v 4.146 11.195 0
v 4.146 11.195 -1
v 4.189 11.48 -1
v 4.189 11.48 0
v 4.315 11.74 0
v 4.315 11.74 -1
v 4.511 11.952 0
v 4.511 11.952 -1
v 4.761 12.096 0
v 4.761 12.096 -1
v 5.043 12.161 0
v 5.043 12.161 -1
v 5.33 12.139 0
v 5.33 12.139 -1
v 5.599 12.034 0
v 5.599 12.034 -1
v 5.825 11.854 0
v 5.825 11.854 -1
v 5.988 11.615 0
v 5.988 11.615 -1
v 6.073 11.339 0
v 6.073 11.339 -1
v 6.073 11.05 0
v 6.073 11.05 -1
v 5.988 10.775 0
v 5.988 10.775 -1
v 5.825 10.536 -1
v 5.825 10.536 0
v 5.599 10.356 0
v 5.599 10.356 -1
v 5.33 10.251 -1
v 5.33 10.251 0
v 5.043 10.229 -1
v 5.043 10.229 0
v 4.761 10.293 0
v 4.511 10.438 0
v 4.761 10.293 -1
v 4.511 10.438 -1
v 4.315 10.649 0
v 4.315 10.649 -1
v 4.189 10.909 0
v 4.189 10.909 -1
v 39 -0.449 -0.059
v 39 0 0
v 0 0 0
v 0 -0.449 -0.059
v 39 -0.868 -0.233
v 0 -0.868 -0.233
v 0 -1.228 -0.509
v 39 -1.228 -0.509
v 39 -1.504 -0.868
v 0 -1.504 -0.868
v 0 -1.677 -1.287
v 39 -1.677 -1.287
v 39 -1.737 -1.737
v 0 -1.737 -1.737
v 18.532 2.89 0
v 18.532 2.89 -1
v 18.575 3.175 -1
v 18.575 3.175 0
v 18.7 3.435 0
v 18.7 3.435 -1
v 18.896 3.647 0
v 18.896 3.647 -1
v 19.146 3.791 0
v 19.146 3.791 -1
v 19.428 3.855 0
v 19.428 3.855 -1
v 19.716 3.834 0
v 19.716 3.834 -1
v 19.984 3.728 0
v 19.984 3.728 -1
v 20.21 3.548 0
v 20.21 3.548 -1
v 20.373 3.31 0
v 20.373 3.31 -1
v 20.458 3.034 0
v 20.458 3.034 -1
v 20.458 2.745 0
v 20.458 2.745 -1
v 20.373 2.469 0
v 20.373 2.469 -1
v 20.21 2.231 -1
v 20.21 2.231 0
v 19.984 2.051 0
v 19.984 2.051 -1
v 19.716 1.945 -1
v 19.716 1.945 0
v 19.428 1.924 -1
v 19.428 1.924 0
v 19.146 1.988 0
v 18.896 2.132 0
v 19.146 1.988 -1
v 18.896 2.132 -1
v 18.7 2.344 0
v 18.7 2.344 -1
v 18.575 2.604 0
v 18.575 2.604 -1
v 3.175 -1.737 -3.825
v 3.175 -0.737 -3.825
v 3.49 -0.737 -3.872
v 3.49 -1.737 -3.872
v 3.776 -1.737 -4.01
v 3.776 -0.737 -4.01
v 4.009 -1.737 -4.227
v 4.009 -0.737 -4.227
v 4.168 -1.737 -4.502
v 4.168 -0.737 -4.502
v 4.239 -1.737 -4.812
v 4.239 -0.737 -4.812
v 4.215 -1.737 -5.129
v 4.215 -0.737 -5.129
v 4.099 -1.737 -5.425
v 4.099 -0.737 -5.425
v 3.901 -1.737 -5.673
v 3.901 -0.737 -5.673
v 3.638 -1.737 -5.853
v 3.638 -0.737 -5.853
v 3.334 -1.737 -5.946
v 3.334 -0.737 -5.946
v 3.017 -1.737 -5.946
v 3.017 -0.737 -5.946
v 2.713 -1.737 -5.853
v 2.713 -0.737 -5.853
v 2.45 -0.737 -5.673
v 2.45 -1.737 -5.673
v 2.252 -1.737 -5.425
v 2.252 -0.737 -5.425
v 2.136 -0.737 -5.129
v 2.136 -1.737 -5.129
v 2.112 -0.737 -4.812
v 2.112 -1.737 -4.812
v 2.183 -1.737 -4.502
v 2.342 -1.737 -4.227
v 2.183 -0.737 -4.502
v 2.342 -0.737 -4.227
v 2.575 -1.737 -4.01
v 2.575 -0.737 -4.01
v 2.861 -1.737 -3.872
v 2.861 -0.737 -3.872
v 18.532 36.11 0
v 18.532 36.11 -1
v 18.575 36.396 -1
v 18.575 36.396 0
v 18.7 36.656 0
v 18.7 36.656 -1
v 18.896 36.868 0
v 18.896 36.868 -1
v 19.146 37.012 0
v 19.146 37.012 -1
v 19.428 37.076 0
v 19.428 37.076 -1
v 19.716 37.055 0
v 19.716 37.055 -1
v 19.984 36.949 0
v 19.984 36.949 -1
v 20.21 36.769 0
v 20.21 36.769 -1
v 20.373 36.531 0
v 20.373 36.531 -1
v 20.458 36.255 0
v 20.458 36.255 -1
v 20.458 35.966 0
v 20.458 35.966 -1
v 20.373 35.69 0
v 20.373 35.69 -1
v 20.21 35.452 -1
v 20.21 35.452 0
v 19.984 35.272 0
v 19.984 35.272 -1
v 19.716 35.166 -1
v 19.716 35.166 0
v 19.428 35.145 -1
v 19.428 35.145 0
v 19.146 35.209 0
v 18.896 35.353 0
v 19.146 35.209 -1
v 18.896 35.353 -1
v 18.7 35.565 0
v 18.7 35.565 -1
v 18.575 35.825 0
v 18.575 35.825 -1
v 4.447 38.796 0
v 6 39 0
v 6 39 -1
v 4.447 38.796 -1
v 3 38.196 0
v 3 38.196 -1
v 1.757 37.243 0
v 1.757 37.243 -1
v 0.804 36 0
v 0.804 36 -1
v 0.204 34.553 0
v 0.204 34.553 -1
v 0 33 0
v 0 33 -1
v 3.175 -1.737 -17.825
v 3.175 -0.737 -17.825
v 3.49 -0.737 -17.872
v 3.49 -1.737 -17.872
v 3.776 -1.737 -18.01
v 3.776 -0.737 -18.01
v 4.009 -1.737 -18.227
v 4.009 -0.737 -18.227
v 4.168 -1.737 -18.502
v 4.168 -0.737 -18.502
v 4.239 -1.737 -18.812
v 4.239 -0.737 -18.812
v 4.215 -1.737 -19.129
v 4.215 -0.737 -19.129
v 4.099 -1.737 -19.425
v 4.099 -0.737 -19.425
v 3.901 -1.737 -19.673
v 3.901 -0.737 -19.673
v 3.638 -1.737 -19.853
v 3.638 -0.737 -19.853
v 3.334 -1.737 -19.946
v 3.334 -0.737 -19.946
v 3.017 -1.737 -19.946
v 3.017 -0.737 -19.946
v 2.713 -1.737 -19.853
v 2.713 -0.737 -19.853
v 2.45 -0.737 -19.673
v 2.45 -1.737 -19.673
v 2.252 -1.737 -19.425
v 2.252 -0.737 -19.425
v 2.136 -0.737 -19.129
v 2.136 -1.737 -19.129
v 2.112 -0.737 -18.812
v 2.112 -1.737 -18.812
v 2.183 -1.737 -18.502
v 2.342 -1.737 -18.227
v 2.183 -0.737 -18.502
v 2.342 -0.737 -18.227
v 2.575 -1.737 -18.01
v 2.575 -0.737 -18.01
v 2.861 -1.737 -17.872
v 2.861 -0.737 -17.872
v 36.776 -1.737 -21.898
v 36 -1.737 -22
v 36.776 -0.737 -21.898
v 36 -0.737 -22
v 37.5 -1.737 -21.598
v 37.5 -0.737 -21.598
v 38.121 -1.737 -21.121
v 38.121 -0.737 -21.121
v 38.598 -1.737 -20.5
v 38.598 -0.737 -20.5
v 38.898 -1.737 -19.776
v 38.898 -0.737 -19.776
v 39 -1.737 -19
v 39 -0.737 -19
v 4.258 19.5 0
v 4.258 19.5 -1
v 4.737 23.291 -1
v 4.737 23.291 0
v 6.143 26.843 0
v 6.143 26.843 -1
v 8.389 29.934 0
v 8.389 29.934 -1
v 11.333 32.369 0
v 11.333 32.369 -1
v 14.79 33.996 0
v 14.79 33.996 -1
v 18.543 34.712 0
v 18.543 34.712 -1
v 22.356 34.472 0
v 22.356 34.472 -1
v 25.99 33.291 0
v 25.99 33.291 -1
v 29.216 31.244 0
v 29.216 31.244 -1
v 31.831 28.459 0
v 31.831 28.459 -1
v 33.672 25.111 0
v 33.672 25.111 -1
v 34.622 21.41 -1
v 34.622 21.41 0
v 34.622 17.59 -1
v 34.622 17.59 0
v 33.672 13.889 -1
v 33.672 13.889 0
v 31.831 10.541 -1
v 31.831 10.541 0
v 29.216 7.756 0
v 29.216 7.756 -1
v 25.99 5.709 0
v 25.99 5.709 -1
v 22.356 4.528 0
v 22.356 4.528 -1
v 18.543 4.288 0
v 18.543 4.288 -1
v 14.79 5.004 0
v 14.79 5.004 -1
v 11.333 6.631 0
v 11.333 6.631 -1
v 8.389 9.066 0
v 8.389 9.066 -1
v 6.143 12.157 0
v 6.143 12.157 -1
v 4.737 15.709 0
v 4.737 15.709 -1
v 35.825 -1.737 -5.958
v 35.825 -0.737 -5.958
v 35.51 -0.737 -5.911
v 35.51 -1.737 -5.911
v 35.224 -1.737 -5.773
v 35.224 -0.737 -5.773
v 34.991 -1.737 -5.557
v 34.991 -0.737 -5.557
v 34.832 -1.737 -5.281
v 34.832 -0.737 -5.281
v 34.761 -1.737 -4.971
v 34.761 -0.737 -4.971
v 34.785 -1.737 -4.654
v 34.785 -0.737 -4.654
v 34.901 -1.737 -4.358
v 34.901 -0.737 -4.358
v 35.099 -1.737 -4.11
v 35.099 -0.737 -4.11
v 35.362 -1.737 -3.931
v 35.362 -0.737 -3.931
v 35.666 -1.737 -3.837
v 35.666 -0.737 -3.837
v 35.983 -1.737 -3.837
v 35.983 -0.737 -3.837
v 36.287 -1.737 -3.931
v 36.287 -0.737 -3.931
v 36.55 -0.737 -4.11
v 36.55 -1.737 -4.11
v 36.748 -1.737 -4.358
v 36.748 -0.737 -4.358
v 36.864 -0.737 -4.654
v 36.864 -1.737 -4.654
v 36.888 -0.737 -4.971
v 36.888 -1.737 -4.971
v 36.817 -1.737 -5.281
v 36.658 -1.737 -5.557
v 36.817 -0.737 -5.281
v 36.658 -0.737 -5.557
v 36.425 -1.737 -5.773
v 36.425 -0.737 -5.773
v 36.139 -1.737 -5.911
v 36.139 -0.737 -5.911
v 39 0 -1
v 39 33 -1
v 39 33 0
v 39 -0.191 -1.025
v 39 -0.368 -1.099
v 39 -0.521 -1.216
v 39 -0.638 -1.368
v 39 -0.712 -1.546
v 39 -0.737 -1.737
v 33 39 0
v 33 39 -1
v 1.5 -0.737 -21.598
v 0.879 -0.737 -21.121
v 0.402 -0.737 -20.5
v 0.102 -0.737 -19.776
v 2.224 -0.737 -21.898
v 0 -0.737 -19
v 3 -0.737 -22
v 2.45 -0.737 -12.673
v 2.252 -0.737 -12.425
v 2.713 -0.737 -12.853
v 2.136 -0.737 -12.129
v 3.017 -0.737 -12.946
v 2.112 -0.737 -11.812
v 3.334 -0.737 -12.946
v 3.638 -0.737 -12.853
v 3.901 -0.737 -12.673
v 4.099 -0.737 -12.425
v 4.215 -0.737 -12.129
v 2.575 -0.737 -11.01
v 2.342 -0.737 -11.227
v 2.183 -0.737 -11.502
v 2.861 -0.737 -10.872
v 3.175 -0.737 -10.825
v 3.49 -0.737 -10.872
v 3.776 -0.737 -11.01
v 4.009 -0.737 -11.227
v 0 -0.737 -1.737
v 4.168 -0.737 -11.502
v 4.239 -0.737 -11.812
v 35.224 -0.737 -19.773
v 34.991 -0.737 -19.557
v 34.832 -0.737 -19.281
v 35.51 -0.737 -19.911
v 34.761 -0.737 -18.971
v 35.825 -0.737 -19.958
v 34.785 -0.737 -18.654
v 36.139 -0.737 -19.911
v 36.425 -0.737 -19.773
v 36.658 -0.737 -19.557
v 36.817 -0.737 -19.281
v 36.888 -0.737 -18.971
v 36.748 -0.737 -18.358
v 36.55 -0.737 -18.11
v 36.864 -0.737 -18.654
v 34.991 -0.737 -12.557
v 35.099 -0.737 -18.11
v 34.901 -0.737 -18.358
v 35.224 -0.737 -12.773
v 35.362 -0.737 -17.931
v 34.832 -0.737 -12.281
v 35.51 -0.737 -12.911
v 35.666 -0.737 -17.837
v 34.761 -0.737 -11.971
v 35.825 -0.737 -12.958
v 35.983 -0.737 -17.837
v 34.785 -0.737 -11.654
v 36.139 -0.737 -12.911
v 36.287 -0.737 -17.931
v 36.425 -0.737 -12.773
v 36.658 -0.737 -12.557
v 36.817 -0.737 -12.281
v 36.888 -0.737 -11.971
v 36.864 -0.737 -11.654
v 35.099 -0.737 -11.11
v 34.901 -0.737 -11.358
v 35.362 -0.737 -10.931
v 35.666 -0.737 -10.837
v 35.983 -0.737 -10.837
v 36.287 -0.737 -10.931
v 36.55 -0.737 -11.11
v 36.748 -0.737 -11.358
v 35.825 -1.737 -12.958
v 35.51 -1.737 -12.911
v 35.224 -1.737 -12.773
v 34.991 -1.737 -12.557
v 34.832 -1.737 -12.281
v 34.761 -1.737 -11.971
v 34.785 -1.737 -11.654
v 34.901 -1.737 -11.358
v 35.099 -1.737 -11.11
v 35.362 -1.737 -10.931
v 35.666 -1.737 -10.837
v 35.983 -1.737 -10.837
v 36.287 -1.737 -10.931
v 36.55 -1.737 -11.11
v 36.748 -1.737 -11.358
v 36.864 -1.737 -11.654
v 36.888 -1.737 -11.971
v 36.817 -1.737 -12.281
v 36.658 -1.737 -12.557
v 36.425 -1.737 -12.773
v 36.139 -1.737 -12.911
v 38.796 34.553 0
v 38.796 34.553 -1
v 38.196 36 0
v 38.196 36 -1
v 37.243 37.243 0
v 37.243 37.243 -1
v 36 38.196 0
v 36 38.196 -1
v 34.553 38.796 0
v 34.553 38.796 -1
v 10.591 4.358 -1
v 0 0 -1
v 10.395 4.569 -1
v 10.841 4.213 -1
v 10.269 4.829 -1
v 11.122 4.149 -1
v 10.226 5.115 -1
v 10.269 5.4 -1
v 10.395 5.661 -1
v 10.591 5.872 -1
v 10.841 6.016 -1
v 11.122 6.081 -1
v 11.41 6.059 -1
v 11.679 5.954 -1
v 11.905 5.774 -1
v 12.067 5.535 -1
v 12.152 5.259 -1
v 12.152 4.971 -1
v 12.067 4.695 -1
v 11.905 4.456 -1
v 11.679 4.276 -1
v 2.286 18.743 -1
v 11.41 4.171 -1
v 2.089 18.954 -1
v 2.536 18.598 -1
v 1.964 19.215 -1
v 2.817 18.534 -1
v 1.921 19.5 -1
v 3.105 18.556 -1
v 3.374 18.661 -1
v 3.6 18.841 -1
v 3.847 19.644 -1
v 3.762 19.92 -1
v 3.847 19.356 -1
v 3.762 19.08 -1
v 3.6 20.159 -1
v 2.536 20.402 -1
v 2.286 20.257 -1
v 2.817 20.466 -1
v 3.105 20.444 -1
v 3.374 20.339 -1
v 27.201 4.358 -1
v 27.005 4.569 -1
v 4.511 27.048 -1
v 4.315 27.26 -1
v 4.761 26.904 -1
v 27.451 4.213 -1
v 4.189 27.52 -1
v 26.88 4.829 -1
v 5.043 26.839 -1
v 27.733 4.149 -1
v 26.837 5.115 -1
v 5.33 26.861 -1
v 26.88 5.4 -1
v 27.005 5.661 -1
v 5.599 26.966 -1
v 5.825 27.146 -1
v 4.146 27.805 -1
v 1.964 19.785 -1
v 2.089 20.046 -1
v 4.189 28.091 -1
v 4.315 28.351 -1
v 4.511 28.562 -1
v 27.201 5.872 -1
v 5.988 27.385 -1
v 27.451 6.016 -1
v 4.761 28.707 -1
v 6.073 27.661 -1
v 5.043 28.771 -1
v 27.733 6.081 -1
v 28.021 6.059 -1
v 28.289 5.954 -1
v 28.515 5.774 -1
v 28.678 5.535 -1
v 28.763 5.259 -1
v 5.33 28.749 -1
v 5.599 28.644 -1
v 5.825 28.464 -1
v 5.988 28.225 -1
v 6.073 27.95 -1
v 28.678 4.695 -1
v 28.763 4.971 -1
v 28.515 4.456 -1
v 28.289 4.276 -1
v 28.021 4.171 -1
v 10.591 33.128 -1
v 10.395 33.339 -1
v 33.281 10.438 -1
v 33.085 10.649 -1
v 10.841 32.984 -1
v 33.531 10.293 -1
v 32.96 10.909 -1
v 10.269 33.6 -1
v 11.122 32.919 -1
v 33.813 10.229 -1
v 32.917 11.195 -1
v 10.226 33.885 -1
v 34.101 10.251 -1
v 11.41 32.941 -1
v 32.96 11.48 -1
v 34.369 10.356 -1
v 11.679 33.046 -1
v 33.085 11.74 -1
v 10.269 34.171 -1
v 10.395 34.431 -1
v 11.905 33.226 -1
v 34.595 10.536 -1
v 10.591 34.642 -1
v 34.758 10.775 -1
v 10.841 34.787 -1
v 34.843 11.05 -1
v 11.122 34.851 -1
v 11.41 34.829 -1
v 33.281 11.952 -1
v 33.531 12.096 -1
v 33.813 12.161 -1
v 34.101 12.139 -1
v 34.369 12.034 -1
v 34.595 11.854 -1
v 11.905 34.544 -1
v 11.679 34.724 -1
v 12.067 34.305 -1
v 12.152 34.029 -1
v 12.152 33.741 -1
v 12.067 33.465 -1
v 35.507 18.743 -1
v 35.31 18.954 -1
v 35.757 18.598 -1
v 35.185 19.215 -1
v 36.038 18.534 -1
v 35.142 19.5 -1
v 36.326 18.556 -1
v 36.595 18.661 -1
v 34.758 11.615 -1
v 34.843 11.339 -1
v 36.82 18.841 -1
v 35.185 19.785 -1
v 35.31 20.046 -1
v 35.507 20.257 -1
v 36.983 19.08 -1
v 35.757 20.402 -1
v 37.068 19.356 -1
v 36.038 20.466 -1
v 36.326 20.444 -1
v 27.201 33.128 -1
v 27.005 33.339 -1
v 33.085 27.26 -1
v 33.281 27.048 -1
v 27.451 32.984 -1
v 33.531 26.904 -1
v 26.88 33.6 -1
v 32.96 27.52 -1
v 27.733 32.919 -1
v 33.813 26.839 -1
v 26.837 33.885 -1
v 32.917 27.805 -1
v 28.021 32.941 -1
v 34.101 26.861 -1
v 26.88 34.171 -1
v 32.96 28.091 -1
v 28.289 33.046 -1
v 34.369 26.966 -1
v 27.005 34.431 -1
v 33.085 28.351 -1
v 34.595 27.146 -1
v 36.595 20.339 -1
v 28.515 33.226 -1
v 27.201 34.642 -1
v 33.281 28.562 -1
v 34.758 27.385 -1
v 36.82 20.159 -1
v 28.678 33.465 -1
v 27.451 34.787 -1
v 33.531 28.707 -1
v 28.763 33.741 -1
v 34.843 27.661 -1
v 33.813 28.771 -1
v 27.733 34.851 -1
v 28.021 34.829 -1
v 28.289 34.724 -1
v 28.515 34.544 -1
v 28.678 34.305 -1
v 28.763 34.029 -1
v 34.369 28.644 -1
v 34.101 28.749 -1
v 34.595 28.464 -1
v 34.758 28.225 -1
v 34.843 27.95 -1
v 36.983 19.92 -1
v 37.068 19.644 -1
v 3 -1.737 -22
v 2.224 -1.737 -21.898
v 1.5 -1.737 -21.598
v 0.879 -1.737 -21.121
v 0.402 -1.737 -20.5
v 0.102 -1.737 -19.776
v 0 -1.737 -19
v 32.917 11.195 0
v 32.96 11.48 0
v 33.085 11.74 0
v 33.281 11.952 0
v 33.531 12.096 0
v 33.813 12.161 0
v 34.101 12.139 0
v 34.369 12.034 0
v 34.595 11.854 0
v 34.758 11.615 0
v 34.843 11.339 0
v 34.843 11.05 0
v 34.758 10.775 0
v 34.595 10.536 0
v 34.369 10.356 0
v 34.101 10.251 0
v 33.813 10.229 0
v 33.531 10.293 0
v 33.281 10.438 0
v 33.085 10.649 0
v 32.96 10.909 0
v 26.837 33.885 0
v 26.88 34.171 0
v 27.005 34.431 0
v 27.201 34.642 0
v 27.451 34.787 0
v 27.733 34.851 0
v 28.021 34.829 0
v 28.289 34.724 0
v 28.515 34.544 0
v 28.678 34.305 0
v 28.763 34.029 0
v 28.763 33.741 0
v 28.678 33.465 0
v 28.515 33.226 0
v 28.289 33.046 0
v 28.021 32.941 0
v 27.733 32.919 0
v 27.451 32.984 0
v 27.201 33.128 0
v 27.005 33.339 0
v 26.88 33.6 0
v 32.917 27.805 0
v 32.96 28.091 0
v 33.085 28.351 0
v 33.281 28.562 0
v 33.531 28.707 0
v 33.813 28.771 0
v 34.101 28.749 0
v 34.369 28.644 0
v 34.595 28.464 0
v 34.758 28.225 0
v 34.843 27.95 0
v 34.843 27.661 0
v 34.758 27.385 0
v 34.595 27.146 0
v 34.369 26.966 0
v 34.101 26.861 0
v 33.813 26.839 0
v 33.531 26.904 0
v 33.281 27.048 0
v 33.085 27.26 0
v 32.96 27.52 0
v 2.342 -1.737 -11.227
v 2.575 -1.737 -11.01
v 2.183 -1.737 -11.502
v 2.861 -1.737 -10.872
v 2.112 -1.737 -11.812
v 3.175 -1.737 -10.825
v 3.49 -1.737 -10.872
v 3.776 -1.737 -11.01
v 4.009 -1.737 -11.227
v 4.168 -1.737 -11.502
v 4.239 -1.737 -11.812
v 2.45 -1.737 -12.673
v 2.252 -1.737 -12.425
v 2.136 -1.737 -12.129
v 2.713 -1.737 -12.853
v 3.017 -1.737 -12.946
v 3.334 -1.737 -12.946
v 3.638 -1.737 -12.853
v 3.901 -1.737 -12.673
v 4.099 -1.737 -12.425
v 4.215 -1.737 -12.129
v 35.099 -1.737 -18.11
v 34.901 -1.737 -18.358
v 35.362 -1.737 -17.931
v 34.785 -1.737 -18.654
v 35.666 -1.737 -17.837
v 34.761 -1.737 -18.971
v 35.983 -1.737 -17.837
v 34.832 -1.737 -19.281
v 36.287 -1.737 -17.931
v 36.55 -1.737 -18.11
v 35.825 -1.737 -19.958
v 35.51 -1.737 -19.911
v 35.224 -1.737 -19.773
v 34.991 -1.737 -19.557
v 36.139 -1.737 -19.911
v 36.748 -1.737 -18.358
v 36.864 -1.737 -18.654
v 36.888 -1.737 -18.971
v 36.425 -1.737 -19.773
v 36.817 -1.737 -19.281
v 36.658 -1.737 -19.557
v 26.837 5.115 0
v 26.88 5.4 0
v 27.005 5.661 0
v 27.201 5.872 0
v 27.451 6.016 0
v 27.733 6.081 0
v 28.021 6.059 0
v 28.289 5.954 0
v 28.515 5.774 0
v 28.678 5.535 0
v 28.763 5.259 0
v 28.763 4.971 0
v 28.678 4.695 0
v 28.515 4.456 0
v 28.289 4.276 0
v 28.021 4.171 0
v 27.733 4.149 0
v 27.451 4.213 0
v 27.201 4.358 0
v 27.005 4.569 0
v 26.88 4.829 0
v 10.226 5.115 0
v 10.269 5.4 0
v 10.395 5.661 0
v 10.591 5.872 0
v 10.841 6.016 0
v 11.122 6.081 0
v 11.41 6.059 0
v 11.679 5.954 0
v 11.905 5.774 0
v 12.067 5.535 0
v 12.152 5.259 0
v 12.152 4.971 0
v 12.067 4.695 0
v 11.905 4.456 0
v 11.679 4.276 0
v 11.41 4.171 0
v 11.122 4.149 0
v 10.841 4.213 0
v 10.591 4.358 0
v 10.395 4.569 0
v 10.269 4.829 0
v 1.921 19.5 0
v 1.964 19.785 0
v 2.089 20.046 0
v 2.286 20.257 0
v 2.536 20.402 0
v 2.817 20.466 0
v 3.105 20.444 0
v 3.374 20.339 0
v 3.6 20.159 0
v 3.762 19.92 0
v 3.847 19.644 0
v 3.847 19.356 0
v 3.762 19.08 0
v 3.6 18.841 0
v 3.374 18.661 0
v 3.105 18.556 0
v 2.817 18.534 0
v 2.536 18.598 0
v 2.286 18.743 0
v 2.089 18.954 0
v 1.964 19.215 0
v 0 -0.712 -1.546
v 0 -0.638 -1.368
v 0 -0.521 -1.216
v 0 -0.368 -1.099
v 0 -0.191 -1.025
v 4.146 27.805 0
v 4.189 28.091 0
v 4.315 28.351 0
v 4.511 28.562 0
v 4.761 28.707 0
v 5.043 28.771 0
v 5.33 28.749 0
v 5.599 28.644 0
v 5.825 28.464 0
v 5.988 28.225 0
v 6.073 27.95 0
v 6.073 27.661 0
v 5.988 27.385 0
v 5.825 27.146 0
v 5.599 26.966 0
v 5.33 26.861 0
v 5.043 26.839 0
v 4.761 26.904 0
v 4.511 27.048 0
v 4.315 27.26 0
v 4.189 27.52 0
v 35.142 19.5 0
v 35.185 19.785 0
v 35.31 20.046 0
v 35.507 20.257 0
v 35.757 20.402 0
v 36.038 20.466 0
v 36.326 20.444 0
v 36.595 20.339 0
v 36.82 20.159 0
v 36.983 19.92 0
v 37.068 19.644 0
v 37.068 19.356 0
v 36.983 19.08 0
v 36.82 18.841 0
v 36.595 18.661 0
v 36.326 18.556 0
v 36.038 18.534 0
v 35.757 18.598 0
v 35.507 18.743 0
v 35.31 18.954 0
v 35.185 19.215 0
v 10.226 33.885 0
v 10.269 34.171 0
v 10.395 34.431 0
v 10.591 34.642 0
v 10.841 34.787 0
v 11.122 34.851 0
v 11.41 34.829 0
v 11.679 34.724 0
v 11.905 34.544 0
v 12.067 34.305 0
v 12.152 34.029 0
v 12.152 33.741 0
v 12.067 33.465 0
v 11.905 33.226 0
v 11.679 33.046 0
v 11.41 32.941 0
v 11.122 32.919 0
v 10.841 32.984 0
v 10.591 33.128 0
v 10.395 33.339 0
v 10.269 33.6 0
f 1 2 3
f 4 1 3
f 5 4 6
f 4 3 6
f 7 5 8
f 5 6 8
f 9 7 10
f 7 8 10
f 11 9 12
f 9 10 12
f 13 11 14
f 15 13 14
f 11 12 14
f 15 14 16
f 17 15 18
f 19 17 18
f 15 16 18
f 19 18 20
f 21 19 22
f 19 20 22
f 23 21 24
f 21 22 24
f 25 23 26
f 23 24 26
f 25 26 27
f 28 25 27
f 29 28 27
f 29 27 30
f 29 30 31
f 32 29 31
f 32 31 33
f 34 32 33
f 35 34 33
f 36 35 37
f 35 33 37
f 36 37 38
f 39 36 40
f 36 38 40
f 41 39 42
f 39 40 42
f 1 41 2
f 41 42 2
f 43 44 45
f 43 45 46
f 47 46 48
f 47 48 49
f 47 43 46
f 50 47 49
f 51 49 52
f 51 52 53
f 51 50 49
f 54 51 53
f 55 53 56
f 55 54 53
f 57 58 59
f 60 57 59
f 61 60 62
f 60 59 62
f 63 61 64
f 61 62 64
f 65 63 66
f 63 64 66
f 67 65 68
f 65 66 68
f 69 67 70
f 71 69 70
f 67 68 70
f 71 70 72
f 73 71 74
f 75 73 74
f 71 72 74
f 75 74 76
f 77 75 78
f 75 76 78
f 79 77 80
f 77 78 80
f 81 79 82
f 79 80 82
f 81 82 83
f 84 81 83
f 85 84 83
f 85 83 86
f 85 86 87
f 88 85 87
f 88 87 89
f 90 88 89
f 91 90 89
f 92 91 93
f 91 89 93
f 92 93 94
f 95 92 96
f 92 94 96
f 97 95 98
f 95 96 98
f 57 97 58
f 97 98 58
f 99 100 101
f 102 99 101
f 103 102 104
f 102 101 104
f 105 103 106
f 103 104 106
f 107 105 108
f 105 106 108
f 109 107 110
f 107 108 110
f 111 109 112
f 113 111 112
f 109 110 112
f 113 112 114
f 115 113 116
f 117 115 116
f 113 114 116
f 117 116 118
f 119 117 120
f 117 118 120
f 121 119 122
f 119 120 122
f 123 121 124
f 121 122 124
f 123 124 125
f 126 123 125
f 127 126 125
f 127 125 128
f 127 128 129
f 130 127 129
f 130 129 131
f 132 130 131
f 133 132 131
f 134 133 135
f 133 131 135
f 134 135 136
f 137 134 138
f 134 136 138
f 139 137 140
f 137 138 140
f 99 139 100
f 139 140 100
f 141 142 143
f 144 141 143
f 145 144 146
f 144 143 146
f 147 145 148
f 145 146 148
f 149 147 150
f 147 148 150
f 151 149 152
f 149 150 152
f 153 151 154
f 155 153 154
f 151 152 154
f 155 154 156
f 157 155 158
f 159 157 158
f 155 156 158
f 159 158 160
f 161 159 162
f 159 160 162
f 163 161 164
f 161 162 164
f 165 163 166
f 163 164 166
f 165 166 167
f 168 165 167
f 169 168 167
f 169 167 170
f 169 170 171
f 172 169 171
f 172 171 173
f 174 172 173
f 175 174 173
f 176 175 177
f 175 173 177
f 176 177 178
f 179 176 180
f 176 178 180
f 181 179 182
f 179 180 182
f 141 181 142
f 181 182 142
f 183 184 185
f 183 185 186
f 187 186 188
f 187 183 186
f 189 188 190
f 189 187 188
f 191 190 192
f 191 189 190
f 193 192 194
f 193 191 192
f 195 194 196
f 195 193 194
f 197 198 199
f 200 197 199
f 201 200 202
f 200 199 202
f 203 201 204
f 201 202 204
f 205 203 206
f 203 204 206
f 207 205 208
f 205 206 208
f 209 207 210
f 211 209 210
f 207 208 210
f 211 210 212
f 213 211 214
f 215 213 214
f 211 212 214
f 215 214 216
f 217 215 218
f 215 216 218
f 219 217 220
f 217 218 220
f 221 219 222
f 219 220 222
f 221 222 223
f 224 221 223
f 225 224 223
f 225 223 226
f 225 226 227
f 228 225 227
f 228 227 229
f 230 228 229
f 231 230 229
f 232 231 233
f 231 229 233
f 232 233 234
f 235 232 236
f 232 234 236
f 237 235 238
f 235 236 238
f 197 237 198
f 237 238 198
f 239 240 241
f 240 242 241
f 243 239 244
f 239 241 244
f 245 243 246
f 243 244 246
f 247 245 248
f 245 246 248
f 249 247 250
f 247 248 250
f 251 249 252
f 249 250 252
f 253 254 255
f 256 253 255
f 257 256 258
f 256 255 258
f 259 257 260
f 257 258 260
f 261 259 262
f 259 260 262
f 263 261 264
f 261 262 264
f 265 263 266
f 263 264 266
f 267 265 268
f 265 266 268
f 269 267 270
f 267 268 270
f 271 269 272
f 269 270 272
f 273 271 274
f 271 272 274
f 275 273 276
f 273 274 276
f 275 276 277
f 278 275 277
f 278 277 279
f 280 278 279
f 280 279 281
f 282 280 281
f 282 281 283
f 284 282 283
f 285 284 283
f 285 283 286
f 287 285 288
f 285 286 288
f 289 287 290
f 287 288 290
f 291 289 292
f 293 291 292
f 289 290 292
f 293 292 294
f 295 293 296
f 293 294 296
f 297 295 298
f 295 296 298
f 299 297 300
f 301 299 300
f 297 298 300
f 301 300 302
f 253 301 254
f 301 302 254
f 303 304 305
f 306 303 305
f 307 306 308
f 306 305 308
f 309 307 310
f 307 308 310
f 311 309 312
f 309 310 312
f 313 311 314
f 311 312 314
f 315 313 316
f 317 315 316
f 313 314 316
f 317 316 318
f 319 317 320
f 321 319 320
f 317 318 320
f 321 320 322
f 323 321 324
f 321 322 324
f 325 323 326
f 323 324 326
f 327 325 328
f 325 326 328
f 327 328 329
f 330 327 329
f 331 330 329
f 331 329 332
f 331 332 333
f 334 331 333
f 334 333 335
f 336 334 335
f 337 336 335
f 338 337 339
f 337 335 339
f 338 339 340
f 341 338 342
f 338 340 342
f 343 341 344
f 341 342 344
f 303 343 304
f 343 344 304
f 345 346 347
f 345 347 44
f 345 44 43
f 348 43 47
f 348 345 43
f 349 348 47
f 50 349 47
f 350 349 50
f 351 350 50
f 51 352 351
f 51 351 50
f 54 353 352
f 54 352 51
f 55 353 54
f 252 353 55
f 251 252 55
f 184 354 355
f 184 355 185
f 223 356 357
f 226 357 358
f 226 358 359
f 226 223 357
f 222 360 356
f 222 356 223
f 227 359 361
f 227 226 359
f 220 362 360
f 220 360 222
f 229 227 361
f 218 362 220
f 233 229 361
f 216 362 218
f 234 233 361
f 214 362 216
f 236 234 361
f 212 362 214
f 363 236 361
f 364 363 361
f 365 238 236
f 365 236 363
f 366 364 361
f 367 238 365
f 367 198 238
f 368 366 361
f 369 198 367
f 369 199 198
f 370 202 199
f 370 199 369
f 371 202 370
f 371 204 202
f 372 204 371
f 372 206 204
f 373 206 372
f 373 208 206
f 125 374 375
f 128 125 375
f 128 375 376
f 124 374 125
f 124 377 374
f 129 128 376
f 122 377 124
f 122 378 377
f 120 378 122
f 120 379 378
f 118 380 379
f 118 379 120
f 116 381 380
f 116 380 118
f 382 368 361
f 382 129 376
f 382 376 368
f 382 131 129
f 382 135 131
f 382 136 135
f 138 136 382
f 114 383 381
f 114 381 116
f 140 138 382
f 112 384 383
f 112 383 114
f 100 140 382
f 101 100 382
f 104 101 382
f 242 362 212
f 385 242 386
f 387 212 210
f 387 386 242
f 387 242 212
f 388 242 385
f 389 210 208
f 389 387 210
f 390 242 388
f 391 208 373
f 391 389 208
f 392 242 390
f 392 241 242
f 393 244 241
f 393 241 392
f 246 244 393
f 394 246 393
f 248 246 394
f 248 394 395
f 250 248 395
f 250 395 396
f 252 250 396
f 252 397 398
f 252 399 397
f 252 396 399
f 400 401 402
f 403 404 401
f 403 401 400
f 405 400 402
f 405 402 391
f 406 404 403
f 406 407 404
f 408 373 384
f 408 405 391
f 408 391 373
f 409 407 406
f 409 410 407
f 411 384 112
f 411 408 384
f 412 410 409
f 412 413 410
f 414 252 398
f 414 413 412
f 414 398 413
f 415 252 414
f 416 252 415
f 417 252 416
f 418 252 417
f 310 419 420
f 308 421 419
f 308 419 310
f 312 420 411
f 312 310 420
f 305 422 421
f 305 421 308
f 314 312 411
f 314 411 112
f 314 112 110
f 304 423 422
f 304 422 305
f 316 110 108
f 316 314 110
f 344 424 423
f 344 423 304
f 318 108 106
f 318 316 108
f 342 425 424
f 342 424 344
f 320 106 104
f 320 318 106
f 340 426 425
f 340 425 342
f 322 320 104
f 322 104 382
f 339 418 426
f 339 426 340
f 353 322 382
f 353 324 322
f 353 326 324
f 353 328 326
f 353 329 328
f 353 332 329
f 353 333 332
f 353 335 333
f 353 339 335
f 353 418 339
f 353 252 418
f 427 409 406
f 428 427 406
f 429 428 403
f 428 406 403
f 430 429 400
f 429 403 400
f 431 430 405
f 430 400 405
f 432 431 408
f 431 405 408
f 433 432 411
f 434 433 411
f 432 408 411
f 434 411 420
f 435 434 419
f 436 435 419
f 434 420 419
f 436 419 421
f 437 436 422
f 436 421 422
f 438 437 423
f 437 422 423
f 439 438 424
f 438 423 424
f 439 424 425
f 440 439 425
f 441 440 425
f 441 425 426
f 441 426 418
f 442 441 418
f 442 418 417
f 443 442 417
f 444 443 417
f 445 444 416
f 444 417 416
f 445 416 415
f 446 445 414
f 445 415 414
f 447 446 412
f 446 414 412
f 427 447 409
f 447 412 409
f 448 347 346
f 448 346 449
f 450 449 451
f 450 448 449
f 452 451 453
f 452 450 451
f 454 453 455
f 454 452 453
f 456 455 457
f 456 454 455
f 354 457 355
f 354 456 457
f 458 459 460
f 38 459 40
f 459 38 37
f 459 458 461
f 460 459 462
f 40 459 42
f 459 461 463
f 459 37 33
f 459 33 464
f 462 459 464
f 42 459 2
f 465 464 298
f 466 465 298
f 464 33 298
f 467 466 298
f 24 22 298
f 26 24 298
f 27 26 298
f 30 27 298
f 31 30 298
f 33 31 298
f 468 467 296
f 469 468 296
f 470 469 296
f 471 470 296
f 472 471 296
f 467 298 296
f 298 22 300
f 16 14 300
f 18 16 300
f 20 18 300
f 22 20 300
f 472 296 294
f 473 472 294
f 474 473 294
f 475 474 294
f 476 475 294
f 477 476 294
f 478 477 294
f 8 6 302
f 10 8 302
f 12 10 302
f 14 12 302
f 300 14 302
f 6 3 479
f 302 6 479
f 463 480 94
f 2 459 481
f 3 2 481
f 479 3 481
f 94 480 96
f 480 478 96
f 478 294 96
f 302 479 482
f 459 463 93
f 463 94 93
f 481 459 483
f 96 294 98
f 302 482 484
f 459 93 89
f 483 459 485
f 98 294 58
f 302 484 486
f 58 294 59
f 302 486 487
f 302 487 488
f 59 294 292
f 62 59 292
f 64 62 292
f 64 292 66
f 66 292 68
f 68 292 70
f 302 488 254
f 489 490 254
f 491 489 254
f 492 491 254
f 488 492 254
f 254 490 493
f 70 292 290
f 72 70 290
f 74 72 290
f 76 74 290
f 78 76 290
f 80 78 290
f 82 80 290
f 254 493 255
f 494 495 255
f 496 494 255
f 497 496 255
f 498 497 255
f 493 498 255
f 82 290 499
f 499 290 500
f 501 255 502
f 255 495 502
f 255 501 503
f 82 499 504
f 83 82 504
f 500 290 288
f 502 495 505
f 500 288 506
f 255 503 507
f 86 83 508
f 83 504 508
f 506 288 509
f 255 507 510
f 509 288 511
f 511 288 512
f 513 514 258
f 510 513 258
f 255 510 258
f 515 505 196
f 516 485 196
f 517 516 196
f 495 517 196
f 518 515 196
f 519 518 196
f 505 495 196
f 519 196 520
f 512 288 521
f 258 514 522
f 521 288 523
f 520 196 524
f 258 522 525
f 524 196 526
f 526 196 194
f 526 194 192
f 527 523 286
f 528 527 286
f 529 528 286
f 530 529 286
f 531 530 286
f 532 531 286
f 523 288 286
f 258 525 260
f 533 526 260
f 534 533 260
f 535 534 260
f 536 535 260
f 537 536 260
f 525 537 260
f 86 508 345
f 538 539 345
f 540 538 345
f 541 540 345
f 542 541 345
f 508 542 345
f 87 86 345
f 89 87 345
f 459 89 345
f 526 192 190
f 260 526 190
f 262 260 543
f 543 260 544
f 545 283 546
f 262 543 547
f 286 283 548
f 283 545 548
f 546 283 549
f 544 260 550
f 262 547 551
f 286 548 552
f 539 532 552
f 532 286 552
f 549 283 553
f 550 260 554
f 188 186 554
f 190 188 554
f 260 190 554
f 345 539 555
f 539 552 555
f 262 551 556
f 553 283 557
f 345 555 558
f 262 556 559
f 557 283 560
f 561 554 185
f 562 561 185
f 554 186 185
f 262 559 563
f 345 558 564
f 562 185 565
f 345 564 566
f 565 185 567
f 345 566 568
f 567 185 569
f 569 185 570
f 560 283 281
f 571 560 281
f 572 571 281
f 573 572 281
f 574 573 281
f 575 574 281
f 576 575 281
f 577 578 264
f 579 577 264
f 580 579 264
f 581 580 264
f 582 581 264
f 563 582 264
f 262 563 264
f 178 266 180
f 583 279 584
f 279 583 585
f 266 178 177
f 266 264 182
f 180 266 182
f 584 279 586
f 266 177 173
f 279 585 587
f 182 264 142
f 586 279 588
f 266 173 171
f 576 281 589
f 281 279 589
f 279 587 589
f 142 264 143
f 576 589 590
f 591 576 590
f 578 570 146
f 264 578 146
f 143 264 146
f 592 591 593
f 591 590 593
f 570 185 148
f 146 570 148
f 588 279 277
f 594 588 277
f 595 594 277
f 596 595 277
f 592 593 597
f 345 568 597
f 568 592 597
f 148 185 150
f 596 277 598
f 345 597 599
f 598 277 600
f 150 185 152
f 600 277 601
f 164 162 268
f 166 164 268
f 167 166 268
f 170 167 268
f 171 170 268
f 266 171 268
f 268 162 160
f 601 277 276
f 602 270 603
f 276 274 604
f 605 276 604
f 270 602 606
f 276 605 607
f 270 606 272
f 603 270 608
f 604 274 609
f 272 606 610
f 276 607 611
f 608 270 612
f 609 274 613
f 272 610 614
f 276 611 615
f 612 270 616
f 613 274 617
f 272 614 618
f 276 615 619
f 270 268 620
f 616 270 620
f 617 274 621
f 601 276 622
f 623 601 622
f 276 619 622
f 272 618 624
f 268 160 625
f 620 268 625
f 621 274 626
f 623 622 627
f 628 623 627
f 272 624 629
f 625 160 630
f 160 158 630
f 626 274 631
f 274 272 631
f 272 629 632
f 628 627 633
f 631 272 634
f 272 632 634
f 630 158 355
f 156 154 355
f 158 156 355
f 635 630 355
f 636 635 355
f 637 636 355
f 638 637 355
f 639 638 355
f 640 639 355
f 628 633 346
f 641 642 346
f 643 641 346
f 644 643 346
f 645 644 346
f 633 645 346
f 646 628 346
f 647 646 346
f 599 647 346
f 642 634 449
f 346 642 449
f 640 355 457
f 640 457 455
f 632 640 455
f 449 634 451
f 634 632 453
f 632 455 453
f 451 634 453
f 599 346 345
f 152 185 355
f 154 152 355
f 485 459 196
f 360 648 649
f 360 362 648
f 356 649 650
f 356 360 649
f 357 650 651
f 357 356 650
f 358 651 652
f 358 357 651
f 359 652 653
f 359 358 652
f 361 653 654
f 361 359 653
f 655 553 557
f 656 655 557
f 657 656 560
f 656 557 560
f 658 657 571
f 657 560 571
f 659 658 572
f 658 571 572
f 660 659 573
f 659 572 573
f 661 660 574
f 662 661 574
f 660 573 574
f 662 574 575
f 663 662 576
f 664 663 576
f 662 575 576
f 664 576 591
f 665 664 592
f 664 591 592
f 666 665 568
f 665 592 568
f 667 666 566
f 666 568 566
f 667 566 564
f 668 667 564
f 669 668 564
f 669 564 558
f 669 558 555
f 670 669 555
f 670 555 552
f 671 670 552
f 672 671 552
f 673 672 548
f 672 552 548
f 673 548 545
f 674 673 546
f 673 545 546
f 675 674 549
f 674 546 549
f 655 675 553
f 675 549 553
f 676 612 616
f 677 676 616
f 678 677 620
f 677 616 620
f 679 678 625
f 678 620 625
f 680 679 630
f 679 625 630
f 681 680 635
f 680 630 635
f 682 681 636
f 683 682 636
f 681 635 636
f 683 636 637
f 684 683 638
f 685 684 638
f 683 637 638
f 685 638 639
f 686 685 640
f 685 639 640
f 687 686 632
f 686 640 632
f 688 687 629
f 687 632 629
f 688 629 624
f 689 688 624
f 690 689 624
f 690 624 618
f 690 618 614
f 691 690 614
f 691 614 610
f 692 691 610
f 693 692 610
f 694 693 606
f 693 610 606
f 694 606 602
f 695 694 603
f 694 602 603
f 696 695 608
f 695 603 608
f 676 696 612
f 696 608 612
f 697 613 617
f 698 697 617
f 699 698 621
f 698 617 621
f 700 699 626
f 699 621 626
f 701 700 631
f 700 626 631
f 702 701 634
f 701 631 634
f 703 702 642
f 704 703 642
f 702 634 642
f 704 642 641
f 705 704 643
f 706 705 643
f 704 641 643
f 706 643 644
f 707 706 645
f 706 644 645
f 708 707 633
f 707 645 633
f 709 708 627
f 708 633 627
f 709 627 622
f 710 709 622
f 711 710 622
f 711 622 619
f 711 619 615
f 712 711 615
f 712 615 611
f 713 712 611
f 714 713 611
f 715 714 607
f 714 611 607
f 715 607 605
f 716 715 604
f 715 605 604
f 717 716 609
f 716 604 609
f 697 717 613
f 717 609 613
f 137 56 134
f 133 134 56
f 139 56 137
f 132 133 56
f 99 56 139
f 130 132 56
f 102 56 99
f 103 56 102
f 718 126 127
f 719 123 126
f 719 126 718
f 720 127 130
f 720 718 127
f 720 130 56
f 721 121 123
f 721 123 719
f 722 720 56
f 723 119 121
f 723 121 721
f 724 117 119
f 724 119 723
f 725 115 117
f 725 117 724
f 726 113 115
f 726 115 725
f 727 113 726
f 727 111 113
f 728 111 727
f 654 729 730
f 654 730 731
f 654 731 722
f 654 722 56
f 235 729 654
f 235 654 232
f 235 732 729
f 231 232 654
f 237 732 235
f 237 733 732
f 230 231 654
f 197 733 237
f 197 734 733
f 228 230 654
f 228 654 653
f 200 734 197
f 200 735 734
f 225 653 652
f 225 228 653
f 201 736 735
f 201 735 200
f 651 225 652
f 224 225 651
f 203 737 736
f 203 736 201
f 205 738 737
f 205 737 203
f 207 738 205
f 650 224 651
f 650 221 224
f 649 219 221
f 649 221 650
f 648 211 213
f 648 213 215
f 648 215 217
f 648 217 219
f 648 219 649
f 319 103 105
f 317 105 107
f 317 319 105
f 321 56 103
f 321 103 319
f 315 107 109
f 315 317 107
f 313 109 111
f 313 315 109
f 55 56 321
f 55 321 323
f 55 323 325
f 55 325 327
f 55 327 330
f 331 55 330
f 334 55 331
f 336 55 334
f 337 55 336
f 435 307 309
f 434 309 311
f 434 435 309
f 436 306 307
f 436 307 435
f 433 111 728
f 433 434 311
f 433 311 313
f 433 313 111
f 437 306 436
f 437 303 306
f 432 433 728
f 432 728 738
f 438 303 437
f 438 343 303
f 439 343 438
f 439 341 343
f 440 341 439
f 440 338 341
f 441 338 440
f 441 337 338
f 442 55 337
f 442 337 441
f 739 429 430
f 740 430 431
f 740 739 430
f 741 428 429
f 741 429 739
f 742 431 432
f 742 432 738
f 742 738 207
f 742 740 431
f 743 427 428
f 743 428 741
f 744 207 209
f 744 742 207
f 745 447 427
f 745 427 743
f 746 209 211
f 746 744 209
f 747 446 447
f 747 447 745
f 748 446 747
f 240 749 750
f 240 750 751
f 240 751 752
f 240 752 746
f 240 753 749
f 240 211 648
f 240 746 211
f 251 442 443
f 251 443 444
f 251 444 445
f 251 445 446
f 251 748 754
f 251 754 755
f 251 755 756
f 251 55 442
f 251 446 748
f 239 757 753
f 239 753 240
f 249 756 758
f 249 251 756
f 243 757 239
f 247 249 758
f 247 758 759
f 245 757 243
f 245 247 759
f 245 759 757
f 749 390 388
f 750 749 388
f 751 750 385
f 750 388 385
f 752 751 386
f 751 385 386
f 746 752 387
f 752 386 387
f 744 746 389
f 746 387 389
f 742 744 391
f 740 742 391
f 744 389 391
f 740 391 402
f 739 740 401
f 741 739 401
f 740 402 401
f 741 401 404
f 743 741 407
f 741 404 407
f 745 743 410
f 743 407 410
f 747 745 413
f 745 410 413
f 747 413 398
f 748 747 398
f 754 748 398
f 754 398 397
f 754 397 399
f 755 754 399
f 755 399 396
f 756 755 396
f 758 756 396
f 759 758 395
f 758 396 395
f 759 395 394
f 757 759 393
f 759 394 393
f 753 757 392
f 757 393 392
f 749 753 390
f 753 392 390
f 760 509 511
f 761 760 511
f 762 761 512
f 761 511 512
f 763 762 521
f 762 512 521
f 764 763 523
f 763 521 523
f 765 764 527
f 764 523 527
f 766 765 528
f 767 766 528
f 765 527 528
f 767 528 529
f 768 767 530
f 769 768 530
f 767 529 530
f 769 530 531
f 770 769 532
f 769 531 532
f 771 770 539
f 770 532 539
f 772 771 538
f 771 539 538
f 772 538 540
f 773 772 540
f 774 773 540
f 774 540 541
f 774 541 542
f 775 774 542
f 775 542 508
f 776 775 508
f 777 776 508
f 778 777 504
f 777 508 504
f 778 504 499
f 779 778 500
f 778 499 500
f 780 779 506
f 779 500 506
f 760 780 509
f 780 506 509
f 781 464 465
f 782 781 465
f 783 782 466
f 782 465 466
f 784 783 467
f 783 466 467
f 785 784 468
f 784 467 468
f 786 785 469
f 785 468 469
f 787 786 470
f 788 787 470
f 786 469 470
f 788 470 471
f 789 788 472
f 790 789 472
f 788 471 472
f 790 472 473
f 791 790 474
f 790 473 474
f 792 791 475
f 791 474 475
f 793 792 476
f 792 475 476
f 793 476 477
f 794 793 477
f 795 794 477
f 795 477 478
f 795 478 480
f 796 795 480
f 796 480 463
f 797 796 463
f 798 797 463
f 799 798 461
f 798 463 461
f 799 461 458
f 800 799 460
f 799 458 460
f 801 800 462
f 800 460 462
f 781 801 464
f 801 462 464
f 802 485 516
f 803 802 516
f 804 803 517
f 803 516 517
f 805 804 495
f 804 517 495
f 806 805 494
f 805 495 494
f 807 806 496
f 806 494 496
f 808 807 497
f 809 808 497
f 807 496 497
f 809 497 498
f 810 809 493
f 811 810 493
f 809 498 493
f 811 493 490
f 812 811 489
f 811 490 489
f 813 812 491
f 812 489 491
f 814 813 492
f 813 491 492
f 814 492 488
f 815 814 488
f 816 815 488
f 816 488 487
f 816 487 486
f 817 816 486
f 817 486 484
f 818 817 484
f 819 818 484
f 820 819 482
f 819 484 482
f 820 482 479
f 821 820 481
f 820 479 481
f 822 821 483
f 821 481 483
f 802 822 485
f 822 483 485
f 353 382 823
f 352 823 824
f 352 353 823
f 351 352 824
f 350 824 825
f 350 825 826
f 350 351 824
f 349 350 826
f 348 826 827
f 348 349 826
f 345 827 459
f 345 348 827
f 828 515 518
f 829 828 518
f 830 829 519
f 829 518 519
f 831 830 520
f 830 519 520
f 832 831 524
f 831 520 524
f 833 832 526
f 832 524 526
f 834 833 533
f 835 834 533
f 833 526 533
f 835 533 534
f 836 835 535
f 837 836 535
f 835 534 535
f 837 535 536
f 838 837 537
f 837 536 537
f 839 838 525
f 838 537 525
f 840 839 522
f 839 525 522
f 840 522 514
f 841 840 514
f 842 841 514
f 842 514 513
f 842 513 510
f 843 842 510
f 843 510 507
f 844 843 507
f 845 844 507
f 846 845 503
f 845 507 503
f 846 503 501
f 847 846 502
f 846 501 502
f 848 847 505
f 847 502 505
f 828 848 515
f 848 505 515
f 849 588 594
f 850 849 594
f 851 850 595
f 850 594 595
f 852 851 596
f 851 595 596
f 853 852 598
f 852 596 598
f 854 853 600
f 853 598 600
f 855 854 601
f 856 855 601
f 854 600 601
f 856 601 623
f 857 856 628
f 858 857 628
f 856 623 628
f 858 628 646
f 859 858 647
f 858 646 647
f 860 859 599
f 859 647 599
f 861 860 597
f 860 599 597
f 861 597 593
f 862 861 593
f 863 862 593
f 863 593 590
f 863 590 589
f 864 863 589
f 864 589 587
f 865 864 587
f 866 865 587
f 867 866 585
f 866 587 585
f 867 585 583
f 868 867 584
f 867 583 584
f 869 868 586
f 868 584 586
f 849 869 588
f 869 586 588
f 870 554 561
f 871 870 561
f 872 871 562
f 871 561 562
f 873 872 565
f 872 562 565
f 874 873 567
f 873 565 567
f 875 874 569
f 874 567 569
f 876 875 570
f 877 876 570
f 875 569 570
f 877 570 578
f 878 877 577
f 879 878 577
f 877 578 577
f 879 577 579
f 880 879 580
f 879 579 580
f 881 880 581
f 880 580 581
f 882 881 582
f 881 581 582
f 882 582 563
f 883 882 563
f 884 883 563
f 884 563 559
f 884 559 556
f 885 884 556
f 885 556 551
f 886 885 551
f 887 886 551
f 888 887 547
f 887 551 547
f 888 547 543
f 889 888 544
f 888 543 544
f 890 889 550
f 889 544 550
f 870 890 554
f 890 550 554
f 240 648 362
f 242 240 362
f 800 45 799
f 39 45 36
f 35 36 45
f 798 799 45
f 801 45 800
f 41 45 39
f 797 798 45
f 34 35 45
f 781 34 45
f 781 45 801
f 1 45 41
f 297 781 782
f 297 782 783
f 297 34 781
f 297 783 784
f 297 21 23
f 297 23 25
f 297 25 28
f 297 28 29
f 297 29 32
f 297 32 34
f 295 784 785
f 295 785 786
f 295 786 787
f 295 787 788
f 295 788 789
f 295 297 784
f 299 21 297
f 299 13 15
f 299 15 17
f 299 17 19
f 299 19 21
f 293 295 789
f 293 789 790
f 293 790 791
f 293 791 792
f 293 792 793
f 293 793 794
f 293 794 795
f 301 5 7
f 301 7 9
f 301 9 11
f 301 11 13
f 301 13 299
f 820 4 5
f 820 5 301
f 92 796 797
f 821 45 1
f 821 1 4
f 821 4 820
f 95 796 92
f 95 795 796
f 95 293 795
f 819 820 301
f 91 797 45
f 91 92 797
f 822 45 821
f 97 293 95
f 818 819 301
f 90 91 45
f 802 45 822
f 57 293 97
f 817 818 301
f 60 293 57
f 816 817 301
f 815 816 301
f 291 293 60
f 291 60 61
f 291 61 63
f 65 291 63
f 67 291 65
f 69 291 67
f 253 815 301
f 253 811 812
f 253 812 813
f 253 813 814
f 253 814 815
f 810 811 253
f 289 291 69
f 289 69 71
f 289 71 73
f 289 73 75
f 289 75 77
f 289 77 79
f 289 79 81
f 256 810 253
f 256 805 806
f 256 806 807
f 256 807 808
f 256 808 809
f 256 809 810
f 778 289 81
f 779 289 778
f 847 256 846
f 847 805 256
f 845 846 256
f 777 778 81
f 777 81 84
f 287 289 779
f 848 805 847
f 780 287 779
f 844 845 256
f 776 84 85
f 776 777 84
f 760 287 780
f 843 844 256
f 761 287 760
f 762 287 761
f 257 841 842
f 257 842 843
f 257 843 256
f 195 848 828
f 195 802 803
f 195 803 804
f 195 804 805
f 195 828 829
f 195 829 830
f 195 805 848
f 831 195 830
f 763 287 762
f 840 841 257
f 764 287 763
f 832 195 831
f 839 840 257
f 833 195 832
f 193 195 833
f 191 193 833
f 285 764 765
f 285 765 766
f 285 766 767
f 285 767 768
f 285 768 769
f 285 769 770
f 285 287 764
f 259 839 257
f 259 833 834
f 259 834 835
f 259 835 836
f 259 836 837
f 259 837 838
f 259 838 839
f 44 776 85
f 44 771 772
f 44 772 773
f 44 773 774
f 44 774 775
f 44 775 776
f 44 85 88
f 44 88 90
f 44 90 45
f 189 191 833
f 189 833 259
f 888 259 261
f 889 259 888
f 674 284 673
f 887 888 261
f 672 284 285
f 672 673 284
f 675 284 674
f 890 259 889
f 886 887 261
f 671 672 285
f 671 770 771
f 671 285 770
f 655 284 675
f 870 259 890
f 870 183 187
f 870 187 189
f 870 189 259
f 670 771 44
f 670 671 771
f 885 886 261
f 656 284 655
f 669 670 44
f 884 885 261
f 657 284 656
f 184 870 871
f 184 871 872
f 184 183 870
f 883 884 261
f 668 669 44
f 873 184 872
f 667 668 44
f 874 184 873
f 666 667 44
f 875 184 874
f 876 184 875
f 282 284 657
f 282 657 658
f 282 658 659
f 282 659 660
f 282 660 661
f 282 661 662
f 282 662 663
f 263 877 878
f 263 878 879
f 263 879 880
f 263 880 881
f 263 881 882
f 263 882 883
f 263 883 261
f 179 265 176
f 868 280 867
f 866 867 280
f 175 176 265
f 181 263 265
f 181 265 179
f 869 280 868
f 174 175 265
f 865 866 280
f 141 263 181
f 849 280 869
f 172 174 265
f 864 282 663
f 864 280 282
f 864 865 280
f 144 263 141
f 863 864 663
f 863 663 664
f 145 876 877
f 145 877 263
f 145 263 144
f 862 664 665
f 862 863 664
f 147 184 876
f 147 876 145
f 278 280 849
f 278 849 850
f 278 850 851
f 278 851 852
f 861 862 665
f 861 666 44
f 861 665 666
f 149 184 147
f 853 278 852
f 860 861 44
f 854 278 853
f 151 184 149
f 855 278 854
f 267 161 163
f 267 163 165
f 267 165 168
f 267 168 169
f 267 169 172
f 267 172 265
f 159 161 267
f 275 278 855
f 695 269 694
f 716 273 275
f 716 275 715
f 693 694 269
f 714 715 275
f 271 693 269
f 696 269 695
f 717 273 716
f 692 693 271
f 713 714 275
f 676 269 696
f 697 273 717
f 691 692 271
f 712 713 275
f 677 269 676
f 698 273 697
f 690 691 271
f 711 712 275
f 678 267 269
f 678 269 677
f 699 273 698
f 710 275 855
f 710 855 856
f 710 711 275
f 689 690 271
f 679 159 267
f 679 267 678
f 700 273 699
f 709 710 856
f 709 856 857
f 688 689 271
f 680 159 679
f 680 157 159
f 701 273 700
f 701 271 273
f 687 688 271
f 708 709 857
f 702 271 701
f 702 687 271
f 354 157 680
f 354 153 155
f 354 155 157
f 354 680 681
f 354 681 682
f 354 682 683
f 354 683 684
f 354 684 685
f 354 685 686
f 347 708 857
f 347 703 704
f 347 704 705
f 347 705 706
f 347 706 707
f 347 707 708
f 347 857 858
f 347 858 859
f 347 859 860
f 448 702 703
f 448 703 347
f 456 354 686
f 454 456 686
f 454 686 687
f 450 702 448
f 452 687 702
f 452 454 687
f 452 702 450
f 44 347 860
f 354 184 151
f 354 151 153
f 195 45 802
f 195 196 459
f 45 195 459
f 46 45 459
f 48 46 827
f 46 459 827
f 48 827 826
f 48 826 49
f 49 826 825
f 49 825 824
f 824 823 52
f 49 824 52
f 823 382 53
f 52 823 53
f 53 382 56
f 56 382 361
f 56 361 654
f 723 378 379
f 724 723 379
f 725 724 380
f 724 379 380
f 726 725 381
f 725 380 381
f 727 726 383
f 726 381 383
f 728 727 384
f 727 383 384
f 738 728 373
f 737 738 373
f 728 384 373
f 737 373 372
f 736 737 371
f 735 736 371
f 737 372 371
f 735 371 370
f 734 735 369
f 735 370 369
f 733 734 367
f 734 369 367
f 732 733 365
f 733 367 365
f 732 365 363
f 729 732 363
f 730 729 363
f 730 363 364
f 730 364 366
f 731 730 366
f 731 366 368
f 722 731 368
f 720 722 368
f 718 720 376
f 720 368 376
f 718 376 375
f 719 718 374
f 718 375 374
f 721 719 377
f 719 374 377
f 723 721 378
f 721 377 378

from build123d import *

# Parameters (mm, degrees)
BASE_FLANGE1_DEPTH = 1
EDGE_FLANGE1_DEPTH = 39
FILLET1_R          = 3
SKETCH12_R         = 15.241955925
SKETCH12_R_2       = 0.968487673
CUT_EXTRUDE1_DEPTH = 1
SKETCH13_R         = 1.066611422
CUT_EXTRUDE2_DEPTH = 1


# Sheet-metal steps are written as plain solids
with BuildPart() as part:
    # Sketch2 → Base-Flange1 (new body)
    with BuildSketch(Plane.XY):
        with BuildLine():
            Line((0, 0), (39, 0))
            Line((39, 0), (39, 33))
            ThreePointArc((39, 33), (37.242640687, 37.242640687), (33, 39))
            Line((33, 39), (6, 39))
            ThreePointArc((6, 39), (1.757359313, 37.242640687), (0, 33))
            Line((0, 33), (0, 0))
        make_face()
    extrude(amount=-BASE_FLANGE1_DEPTH)

    # Edge-Flange1 section (across the edge) → Edge-Flange1 (add)
    with BuildSketch(Plane(origin=(39, -0.7366, -1), x_dir=(0, 1, 0), z_dir=(-1, 0, 0))):
        with BuildLine():
            Line((-1, 0.7366), (-1, 21))
            Line((-1, 21), (0, 21))
            Line((0, 21), (0, 0.7366))
            ThreePointArc((0, 0.7366), (0.215745145, 0.215745145), (0.7366, 0))
            Line((0.7366, 0), (0.7366, -1))
            ThreePointArc((0.7366, -1), (-0.491361636, -0.491361636), (-1, 0.7366))
        make_face()
    extrude(amount=EDGE_FLANGE1_DEPTH)

    # Fillet1
    fillet1_edges = [part.edges().sort_by_distance(p)[0] for p in [
        (39, -1.2366, -22),
        (0, -1.2366, -22),
    ]]
    fillet(fillet1_edges, radius=FILLET1_R)

    # Sketch12 → Cut-Extrude1 (cut)
    with BuildSketch(Plane(origin=(0, 0, -1), x_dir=(-1, 0, 0), z_dir=(0, 0, -1))):
        with Locations((-19.5, 19.5)):
            Circle(SKETCH12_R)
        with Locations((-19.5, 36.110428889)):
            Circle(SKETCH12_R_2)
        with Locations((-27.805214445, 33.885053386)):
            Circle(SKETCH12_R_2)
        with Locations((-33.885053386, 27.805214445)):
            Circle(SKETCH12_R_2)
        with Locations((-36.110428889, 19.5)):
            Circle(SKETCH12_R_2)
        with Locations((-33.885053386, 11.194785555)):
            Circle(SKETCH12_R_2)
        with Locations((-27.805214445, 5.114946614)):
            Circle(SKETCH12_R_2)
        with Locations((-19.5, 2.889571111)):
            Circle(SKETCH12_R_2)
        with Locations((-11.194785555, 5.114946614)):
            Circle(SKETCH12_R_2)
        with Locations((-5.114946614, 11.194785555)):
            Circle(SKETCH12_R_2)
        with Locations((-2.889571111, 19.5)):
            Circle(SKETCH12_R_2)
        with Locations((-5.114946614, 27.805214445)):
            Circle(SKETCH12_R_2)
        with Locations((-11.194785555, 33.885053386)):
            Circle(SKETCH12_R_2)
    extrude(amount=-CUT_EXTRUDE1_DEPTH, mode=Mode.SUBTRACT)

    # Sketch13 → Cut-Extrude2 (cut)
    with BuildSketch(Plane(origin=(0, -0.7366, 0), x_dir=(1, 0, 0), z_dir=(0, 1, 0))):
        with Locations(Location((3.175481607, 18.89157203, 0), (0, 0, 270))):
            Circle(SKETCH13_R)
        with Locations(Location((3.175481607, 11.89157203, 0), (0, 0, 270))):
            Circle(SKETCH13_R)
        with Locations(Location((3.175481607, 4.89157203, 0), (0, 0, 270))):
            Circle(SKETCH13_R)
        with Locations(Location((35.824518393, 4.89157203, 0), (0, 0, 90))):
            Circle(SKETCH13_R)
        with Locations(Location((35.824518393, 11.89157203, 0), (0, 0, 90))):
            Circle(SKETCH13_R)
        with Locations(Location((35.824518393, 18.89157203, 0), (0, 0, 90))):
            Circle(SKETCH13_R)
    extrude(amount=-CUT_EXTRUDE2_DEPTH, mode=Mode.SUBTRACT)


solid = part.part
